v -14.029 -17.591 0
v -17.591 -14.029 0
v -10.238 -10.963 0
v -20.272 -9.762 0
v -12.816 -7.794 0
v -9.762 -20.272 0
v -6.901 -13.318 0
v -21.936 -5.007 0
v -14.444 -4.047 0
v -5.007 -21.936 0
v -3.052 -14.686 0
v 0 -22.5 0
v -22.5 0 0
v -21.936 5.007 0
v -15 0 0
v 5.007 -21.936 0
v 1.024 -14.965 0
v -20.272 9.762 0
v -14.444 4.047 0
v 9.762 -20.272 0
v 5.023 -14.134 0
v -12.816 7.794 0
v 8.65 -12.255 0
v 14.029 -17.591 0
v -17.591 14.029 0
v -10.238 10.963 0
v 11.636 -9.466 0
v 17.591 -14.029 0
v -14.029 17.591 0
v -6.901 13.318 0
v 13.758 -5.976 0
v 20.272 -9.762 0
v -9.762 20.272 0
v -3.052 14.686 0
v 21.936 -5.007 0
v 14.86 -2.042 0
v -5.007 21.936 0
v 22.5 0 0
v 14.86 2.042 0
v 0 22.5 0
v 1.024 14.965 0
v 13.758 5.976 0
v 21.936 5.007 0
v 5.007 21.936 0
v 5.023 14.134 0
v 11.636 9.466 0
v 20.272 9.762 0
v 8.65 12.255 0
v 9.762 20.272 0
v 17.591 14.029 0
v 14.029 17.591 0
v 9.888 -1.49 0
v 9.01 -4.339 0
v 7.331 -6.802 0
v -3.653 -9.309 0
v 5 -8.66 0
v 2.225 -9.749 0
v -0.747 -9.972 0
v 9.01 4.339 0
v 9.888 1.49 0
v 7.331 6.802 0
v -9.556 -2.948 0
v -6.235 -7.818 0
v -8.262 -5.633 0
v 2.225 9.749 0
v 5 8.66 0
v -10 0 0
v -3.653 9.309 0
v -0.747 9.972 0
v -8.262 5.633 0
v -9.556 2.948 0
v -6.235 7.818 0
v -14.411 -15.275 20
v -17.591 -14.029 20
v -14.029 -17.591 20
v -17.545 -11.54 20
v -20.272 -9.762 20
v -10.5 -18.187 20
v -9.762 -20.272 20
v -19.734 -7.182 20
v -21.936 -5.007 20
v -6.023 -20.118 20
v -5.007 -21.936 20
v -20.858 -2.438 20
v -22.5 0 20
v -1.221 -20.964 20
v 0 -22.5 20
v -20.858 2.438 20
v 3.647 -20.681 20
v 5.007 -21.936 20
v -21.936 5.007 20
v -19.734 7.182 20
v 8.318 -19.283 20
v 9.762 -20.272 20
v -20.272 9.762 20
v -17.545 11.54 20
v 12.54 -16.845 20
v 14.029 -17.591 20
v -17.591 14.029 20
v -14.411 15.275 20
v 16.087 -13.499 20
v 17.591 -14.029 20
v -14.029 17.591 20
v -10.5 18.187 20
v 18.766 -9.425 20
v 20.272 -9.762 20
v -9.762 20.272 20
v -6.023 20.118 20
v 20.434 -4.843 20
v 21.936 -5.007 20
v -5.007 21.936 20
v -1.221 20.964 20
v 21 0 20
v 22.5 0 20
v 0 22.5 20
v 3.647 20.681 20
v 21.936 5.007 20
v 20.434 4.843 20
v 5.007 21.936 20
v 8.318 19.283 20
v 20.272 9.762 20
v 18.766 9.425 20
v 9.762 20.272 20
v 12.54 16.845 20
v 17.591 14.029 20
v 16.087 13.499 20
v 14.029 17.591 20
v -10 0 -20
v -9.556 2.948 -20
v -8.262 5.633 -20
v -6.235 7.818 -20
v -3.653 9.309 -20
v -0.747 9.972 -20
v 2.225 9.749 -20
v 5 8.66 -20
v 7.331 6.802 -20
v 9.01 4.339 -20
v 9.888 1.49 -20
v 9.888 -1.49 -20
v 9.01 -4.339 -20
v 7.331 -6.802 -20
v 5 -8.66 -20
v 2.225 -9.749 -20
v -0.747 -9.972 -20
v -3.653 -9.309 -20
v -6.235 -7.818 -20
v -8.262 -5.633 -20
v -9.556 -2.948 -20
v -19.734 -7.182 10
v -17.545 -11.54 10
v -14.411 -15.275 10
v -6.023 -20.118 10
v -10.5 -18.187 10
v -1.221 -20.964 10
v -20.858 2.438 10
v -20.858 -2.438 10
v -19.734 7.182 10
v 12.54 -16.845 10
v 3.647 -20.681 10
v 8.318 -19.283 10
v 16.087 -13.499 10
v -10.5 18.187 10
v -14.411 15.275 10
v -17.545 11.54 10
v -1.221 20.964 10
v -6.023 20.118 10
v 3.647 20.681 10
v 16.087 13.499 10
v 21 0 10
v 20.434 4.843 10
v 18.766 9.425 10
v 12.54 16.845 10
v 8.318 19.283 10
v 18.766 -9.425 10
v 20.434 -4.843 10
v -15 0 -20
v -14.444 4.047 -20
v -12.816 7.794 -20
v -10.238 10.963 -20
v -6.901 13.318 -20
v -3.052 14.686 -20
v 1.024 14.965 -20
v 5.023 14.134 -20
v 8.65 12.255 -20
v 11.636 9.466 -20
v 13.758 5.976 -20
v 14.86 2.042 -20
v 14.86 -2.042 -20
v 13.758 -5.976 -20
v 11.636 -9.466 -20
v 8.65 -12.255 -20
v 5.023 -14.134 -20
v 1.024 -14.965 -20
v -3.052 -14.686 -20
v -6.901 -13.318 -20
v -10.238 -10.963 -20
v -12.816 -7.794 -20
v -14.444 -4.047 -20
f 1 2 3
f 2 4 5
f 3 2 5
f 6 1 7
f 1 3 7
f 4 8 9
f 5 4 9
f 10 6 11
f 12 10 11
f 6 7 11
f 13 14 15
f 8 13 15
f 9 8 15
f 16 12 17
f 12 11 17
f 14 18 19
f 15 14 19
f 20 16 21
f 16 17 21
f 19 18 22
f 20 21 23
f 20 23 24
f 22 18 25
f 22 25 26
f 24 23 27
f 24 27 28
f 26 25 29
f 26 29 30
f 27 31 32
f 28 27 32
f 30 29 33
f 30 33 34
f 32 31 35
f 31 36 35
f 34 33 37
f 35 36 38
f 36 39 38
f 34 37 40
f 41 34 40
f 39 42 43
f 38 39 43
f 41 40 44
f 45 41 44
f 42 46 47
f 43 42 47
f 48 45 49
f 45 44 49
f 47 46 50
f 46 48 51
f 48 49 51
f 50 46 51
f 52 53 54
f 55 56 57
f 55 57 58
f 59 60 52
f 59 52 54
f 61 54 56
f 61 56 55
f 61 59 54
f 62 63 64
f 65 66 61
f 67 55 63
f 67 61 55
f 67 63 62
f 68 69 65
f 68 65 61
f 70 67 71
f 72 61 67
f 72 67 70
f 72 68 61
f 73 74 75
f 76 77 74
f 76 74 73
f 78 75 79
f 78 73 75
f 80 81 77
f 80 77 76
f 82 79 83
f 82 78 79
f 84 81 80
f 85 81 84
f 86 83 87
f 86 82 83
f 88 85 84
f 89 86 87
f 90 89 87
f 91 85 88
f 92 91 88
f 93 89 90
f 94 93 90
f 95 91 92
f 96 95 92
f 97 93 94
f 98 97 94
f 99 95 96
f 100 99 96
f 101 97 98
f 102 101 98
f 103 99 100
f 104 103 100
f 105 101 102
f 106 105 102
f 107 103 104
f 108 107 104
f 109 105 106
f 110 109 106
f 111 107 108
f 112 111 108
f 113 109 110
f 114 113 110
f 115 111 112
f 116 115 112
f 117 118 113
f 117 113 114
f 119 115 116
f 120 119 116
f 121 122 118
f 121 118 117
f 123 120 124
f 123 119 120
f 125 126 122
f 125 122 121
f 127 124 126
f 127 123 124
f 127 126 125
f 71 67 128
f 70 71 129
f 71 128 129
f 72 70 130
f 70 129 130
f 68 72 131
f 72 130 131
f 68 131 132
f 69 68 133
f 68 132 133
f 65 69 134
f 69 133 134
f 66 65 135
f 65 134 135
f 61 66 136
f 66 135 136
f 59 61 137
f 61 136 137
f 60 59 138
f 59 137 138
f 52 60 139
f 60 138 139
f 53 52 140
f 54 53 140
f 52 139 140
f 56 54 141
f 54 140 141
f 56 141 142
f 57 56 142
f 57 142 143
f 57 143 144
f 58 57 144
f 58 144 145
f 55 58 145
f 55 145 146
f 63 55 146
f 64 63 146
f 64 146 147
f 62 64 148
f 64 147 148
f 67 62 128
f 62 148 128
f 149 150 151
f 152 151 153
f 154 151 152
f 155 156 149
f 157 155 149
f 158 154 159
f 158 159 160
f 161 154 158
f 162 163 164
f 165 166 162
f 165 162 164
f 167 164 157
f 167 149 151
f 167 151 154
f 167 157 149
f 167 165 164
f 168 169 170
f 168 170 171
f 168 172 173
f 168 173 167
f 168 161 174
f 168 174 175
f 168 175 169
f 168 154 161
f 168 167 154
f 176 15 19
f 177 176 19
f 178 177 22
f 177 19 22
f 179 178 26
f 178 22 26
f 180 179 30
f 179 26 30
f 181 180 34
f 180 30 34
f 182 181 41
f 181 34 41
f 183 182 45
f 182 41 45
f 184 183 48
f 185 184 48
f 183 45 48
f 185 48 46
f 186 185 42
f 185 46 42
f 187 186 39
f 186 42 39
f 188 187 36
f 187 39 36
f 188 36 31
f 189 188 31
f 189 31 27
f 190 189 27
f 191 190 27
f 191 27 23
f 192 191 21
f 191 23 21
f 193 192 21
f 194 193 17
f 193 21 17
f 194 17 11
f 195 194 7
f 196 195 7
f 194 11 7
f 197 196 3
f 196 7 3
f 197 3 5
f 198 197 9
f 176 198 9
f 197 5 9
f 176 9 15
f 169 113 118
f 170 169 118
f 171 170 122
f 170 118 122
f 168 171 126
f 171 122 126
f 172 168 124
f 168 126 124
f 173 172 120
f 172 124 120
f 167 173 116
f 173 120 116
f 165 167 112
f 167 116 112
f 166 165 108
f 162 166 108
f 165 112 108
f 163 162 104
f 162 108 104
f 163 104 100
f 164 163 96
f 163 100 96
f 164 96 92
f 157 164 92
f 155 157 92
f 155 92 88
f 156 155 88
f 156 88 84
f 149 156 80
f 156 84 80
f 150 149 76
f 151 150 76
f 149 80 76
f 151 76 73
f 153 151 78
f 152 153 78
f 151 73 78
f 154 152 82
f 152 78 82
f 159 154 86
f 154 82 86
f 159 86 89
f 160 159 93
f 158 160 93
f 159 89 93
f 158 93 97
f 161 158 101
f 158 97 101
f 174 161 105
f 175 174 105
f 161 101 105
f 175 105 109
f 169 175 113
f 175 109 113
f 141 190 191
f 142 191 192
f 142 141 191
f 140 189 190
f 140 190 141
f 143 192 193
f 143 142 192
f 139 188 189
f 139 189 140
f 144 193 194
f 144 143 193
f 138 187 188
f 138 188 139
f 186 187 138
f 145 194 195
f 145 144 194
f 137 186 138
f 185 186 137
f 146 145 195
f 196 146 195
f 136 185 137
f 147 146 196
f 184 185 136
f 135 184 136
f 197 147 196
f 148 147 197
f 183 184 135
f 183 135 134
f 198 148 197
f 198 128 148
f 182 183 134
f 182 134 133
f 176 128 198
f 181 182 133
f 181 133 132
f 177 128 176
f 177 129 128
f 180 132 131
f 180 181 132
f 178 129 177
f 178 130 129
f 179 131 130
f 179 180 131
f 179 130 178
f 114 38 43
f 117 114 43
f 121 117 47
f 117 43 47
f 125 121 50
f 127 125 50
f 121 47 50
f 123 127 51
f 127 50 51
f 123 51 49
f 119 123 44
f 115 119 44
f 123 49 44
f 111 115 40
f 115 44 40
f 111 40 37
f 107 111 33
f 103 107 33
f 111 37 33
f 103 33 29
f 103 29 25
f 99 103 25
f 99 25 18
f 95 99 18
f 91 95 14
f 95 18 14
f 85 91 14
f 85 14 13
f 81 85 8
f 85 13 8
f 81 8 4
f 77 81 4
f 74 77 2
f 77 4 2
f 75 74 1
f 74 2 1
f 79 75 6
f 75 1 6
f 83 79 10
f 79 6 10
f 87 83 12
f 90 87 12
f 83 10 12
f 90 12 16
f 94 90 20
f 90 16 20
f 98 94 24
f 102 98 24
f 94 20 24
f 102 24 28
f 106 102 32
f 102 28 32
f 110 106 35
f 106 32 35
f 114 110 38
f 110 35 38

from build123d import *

# Parameters (mm, degrees)
SKETCH1_R           = 22.5
BOSS_EXTRUDE3_DEPTH = 20
SKETCH4_R           = 21
CUT_EXTRUDE2_DEPTH  = 10
SKETCH5_R           = 15
BOSS_EXTRUDE4_DEPTH = 20
SKETCH6_R           = 10
CUT_EXTRUDE4_DEPTH  = 20


with BuildPart() as part:
    # Sketch1 → Boss-Extrude3 (new body)
    with BuildSketch(Plane.XY):
        Circle(SKETCH1_R)
    extrude(amount=BOSS_EXTRUDE3_DEPTH)

    # Sketch4 → Cut-Extrude2 (cut)
    with BuildSketch(Plane.XY.offset(20)):
        Circle(SKETCH4_R)
    extrude(amount=-CUT_EXTRUDE2_DEPTH, mode=Mode.SUBTRACT)

    # Sketch5 → Boss-Extrude4 (add)
    with BuildSketch(Plane(origin=(0, 0, 0), x_dir=(-1, 0, 0), z_dir=(0, 0, -1))):
        Circle(SKETCH5_R)
    extrude(amount=BOSS_EXTRUDE4_DEPTH)

    # Sketch6 → Cut-Extrude4 (cut)
    with BuildSketch(Plane(origin=(0, 0, -20), x_dir=(-1, 0, 0), z_dir=(0, 0, -1))):
        Circle(SKETCH6_R)
    extrude(amount=-CUT_EXTRUDE4_DEPTH, mode=Mode.SUBTRACT)


solid = part.part
